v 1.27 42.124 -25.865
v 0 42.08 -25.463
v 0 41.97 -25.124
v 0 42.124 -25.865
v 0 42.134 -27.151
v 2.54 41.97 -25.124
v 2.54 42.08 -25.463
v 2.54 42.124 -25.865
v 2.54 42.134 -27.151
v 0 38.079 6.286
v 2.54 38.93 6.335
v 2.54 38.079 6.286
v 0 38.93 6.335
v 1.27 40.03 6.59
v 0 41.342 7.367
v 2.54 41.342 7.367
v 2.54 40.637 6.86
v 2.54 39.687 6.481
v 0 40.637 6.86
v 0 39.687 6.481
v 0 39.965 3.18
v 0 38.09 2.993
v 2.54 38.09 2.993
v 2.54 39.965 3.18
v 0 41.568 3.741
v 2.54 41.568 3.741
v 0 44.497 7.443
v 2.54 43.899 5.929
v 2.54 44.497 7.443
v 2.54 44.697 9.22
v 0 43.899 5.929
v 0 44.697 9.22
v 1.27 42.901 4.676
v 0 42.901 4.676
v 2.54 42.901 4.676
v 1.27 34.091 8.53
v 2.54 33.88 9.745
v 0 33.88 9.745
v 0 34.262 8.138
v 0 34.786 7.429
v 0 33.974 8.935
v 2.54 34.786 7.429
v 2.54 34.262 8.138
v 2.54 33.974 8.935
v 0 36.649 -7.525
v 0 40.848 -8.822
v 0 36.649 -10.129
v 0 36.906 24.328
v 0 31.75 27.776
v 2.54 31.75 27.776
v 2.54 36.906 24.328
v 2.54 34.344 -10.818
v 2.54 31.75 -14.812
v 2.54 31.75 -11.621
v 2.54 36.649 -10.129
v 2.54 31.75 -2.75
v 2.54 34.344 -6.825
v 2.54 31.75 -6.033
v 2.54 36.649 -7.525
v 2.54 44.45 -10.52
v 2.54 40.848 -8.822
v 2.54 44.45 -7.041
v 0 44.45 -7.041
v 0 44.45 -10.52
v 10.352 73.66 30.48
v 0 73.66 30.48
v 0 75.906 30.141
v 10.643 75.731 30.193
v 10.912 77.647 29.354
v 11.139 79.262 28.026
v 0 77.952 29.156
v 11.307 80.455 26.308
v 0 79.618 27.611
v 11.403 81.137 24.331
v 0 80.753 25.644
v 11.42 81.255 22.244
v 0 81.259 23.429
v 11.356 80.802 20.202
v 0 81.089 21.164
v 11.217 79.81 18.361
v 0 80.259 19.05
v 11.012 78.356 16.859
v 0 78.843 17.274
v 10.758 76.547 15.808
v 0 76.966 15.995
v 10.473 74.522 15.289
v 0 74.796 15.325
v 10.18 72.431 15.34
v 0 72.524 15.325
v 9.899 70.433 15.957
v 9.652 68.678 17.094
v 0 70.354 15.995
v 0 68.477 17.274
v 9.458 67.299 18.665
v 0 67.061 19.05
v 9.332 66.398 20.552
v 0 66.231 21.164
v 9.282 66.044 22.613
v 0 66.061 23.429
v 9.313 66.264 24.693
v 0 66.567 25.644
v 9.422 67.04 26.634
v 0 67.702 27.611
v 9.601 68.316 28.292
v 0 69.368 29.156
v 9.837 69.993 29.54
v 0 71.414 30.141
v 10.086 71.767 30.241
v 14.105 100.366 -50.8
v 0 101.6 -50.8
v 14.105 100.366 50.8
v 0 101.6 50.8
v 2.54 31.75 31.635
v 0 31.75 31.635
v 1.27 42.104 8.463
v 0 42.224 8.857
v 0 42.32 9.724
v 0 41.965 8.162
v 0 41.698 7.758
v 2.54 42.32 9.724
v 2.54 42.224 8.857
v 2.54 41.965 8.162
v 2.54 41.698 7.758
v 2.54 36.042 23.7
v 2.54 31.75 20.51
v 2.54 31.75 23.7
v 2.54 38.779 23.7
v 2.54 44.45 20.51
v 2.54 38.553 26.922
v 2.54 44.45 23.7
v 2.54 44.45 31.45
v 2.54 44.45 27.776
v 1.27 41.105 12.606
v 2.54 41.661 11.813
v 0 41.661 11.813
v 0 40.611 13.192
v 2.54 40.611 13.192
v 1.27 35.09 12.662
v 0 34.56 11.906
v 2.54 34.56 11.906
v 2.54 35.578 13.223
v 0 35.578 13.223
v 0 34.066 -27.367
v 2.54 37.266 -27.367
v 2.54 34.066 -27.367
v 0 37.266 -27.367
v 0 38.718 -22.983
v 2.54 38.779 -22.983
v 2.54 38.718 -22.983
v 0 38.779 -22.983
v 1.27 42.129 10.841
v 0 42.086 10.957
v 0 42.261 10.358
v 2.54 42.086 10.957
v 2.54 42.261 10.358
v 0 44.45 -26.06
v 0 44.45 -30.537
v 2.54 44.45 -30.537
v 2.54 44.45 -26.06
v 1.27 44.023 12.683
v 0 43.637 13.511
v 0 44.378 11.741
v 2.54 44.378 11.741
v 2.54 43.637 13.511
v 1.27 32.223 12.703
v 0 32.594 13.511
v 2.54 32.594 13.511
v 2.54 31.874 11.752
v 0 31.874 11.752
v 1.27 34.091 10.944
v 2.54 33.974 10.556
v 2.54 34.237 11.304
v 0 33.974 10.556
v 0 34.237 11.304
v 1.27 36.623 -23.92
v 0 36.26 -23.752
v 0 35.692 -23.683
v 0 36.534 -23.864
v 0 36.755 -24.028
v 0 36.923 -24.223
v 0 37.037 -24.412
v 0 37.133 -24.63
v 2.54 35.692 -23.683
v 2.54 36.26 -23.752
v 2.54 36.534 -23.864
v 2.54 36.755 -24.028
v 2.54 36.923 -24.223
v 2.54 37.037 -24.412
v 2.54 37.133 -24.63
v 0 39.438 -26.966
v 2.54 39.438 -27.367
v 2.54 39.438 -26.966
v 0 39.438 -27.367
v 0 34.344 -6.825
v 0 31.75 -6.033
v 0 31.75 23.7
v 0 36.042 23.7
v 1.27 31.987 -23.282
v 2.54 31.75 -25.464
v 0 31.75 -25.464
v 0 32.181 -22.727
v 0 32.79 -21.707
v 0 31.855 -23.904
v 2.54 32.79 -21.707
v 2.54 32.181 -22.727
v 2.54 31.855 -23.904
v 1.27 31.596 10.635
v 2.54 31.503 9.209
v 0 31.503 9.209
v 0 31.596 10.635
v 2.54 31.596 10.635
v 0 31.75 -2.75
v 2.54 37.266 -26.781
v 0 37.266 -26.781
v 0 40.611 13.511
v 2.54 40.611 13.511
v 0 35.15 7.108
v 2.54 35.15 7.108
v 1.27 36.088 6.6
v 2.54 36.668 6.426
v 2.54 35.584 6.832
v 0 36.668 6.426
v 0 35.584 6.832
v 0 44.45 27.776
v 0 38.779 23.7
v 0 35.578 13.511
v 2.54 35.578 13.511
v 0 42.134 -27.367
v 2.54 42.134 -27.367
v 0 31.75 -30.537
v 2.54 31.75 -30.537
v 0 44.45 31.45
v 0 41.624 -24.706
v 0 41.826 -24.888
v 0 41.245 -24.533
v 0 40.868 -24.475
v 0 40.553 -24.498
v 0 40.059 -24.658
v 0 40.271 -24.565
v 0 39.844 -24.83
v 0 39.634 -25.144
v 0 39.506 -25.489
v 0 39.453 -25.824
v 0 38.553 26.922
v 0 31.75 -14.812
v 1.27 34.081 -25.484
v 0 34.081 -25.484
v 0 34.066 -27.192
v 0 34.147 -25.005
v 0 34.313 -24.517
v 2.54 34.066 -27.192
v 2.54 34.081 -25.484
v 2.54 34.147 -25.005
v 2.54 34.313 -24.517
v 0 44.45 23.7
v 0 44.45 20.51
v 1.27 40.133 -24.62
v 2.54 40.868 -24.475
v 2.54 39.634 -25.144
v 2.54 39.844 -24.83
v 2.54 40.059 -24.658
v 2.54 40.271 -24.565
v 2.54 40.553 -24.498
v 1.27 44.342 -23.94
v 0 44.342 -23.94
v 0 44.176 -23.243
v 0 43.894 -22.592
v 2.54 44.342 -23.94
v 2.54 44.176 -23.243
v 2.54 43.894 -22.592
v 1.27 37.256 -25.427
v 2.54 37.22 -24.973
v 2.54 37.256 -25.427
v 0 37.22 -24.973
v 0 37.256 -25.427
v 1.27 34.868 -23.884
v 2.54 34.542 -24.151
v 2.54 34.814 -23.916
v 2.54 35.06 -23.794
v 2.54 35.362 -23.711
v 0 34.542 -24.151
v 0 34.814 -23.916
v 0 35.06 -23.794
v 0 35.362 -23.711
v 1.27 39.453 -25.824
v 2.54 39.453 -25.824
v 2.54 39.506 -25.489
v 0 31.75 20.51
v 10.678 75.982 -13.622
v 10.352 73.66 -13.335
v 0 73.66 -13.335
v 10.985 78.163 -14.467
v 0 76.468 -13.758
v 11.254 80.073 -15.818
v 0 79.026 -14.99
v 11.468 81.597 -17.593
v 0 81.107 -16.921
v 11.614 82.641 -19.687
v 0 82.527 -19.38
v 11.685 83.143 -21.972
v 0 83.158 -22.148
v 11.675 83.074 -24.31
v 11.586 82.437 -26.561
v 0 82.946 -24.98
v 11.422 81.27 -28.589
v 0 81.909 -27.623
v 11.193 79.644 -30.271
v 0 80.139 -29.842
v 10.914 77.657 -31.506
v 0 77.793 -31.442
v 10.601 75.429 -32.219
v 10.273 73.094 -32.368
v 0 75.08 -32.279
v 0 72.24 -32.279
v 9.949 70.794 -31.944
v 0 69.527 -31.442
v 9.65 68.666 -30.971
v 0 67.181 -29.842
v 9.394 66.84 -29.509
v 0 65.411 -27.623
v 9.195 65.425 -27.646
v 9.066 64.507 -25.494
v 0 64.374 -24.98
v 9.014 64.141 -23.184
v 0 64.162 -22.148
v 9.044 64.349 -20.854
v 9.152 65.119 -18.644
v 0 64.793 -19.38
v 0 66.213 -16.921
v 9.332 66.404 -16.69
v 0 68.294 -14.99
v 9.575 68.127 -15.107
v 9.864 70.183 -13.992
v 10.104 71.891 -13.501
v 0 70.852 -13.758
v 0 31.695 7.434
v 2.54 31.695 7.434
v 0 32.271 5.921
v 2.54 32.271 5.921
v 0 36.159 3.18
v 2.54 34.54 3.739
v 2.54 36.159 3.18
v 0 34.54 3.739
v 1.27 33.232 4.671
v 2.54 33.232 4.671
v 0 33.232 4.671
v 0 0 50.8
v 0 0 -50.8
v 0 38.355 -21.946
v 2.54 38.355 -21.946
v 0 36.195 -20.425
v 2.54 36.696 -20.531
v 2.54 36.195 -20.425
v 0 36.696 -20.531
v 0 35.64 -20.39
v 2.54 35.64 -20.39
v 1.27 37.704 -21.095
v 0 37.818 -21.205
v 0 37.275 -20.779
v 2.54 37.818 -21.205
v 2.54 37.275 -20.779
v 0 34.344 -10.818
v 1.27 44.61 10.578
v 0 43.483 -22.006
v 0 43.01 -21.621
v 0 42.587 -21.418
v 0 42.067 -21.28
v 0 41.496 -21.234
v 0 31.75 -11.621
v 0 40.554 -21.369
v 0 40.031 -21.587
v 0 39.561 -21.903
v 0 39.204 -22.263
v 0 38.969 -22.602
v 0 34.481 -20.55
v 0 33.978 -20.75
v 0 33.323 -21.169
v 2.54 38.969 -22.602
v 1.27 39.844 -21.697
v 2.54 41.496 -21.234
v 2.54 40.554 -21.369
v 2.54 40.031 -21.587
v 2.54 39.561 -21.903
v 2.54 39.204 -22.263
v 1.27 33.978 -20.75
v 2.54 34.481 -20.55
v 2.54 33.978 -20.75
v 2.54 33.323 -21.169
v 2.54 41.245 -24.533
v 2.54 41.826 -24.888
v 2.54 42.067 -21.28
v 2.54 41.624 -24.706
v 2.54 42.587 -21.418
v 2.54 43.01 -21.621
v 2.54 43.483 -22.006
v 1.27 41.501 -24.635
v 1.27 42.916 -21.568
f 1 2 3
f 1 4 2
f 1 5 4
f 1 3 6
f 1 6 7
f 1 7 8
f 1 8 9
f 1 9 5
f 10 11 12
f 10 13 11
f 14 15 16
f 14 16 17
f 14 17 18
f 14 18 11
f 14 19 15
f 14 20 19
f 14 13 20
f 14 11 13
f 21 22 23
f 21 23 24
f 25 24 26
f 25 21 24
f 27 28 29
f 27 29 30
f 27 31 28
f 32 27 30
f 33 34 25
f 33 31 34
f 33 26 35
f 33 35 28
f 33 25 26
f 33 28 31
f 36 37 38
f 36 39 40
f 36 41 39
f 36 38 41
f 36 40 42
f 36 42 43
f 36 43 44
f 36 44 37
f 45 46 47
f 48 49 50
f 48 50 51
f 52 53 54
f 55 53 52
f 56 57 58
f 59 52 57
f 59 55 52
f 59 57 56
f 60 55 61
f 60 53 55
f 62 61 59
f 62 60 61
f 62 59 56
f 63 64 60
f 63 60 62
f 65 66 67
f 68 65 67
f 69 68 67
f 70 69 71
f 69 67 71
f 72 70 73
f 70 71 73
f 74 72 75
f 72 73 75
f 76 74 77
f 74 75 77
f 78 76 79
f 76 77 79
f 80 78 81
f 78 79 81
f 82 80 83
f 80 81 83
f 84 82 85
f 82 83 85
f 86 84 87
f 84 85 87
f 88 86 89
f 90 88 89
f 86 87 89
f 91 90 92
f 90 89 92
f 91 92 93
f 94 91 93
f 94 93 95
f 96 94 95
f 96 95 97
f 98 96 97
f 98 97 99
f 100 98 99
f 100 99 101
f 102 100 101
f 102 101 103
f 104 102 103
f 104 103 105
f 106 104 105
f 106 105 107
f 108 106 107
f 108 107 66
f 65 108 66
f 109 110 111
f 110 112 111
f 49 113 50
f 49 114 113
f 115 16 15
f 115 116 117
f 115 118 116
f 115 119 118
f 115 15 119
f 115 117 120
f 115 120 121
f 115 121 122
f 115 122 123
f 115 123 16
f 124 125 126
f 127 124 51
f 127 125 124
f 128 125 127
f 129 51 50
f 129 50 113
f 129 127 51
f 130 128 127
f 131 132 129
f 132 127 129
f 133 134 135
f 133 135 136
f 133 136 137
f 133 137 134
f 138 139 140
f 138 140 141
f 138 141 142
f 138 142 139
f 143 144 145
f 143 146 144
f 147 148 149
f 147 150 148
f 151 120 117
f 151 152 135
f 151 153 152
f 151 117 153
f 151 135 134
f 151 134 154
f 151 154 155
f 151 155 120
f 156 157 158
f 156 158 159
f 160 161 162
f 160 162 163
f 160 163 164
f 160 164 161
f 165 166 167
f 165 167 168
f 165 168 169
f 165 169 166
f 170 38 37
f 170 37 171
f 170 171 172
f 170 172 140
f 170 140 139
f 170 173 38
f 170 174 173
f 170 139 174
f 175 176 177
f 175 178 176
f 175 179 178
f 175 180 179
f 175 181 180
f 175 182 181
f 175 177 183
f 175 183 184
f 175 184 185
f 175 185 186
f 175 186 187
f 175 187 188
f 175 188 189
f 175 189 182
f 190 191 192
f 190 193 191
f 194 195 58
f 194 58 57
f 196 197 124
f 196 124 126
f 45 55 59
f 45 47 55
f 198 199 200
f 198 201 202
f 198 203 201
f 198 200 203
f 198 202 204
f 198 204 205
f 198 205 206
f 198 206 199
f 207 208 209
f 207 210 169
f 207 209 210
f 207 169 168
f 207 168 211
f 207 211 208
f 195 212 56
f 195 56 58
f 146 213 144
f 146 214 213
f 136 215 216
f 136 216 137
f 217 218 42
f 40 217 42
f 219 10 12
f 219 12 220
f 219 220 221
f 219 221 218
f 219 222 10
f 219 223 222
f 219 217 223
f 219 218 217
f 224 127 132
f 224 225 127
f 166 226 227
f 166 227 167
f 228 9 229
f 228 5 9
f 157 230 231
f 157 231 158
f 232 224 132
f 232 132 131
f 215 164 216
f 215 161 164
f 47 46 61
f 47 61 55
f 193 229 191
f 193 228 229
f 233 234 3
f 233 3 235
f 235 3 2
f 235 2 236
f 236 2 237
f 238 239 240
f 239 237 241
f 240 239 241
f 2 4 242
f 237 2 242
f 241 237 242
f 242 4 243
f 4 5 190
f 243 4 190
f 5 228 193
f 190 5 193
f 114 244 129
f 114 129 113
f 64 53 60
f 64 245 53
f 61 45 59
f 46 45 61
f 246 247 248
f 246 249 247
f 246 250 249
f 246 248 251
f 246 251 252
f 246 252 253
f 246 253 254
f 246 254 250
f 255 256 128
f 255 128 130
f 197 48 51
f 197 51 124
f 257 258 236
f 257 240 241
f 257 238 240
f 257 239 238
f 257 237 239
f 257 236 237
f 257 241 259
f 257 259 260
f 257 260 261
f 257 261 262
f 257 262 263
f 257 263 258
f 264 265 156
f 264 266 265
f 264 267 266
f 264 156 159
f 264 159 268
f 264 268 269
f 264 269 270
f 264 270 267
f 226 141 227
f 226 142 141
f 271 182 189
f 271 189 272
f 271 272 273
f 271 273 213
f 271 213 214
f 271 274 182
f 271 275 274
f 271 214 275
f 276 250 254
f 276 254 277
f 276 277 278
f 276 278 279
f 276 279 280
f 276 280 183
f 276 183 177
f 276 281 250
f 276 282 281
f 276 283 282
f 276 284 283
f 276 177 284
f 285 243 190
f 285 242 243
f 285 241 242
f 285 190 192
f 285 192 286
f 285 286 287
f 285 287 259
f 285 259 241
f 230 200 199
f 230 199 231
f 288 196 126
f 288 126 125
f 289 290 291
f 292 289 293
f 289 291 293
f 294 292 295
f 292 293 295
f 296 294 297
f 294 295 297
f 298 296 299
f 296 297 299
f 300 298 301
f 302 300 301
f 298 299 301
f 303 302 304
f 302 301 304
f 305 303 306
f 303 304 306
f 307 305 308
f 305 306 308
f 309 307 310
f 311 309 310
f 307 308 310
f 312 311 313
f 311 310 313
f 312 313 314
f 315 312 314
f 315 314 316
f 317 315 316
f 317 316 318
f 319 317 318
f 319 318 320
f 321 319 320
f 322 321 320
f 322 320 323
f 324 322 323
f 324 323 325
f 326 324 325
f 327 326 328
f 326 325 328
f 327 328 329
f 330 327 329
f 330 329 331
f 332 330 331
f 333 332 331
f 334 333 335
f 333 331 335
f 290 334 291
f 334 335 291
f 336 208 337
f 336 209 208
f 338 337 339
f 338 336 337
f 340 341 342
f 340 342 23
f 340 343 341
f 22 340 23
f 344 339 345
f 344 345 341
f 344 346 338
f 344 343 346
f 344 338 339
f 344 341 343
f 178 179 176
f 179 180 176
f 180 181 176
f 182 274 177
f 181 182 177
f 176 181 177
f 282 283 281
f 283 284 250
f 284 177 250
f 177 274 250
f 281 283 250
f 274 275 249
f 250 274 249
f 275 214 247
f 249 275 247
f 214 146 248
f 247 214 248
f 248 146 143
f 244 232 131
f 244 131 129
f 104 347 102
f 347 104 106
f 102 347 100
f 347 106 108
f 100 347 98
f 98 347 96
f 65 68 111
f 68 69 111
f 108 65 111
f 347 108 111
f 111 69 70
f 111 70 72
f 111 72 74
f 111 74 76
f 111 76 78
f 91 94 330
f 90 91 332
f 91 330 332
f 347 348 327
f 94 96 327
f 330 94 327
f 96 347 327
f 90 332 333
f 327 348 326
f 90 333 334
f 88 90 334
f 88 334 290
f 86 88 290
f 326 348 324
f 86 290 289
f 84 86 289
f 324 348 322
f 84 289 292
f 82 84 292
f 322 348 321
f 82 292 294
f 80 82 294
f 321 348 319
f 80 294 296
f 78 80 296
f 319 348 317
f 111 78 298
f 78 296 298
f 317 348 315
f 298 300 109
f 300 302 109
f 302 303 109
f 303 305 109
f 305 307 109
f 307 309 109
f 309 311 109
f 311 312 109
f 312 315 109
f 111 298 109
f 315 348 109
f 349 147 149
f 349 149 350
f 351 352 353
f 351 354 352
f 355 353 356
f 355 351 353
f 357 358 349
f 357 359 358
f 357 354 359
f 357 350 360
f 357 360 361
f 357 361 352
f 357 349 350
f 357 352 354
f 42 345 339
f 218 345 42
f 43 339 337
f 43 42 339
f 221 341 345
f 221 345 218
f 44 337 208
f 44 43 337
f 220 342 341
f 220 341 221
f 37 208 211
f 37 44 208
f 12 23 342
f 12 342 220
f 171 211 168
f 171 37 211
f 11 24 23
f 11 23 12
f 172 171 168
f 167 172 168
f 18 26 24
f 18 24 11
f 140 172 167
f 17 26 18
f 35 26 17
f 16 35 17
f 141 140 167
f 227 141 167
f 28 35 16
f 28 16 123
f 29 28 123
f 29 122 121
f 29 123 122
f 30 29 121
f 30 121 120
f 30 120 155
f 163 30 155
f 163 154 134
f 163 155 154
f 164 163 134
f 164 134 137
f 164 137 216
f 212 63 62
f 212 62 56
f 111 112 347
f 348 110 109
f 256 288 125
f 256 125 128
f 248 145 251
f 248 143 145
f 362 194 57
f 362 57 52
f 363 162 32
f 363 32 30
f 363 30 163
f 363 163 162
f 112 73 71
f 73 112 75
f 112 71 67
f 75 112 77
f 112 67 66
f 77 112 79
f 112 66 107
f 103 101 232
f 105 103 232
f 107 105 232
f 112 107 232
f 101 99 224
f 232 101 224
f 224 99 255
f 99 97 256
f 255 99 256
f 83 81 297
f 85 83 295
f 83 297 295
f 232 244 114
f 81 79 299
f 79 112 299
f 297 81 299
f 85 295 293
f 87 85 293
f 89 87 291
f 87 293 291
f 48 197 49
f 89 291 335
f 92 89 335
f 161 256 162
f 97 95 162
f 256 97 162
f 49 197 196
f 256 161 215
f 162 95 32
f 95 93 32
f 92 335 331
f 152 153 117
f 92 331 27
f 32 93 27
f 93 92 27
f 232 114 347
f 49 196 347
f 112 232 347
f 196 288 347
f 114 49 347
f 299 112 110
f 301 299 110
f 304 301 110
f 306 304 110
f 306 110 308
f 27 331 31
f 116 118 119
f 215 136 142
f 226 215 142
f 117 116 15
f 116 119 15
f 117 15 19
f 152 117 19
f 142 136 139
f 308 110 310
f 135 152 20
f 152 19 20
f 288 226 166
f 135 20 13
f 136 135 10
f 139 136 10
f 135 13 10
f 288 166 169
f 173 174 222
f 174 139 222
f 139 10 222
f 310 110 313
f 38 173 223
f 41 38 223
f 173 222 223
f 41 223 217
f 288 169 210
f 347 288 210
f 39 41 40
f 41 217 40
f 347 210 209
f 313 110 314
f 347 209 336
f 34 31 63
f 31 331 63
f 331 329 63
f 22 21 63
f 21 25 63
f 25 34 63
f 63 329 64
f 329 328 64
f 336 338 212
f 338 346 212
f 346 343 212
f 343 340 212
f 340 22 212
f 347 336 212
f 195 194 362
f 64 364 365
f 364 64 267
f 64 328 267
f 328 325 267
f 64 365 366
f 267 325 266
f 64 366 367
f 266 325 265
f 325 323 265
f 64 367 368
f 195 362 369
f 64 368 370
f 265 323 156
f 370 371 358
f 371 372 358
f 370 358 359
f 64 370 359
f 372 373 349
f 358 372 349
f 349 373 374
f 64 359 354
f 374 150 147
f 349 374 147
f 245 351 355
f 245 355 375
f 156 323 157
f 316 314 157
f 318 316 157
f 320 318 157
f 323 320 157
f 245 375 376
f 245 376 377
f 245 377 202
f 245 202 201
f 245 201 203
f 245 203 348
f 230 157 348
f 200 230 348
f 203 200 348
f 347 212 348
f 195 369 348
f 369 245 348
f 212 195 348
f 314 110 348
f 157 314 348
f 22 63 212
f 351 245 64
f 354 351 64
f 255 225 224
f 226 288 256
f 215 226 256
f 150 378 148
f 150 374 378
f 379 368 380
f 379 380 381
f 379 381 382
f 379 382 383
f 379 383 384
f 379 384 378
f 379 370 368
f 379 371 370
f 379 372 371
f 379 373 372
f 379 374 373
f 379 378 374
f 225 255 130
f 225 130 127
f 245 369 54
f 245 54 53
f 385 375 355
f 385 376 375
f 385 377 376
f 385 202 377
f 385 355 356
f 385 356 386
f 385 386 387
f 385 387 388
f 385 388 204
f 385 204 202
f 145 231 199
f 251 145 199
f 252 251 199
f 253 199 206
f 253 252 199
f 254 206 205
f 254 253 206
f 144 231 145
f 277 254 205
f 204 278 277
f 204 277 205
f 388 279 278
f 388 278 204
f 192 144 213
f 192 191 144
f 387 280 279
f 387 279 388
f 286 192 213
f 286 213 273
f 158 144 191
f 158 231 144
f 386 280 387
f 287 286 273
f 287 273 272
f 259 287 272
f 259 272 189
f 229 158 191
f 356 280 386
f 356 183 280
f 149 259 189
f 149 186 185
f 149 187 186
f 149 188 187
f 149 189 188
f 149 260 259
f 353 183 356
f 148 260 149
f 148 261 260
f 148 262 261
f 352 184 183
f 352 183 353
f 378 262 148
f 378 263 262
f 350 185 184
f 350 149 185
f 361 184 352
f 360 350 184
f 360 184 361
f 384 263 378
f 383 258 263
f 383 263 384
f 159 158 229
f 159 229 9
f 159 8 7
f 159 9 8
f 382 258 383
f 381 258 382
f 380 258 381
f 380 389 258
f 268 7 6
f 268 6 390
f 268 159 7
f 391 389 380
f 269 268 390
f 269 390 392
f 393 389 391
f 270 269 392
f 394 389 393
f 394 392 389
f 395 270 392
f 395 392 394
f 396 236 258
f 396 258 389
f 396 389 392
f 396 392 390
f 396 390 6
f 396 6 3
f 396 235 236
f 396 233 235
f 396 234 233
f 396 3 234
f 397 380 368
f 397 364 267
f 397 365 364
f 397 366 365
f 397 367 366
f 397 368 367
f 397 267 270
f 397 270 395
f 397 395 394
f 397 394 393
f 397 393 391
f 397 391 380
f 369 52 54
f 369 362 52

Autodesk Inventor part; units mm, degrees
ref_plane "YZ Plane" through (0, 0, 0) normal (1, 0, 0) x (0, 1, 0)
ref_plane "XZ Plane" through (0, 0, 0) normal (0, 1, 0) x (-1, 0, 0)
sketch "Sketch1" plane through (0, 0, 0) normal (0, 0, 1) x (1, 0, 0)
  line L0 (0, 0) -> (14.2789, 101.6)
  line L1 (14.2789, 101.6) -> (0, 101.6)
  line L2 (0, 101.6) -> (0, 0)
  dimension "d0" = 101.6
  dimension "d1" = 8
  dimension "d2" = 14.279
extrude "Extrusion1" add sketch "Sketch1" along normal mid plane 101.6
ref_plane "Work Plane2" through (0, 0, 42.3872) normal (-1, 0, 0) x (0, 0, 1)
sketch "Sketch6" plane through (0, 0, 42.3872) normal (-1, 0, 0) x (0, 0, 1)
  line L0 (-84.1061, 73.66) -> (0, 73.66) construction
  line L1 (0, 101.6) -> (0, 0) construction
  line L2 (-84.7743, 101.6) -> (0, 101.6) construction
  circle A0 centre (-65.2472, 73.66) radius 9.525
  circle A1 centre (-19.5272, 73.66) radius 7.62
  line L3 (-42.3872, 121.92) -> (-42.3872, -20.32) projected
  point P0 (-42.3872, 0)
  dimension "d18" = 27.94
  dimension "d19" = 19.05
  dimension "d20" = 15.24
  dimension "d21" = 22.86
  dimension "d22" = 22.86
  dimension "d23" = 45.72
extrude "Extrusion5" cut sketch "Sketch6" against normal through all
ref_plane "Work Plane3" through (0, 0, 22.86) normal (0, 0, 1) x (1, 0, 0)
ref_plane "Work Plane4" through (0, 0, -22.86) normal (0, 0, 1) x (1, 0, 0)
sketch "Sketch9" plane through (0, 0, -50.8) normal (-1, 0, 0) x (0, 0, 1)
  line L0 (0, 101.6) -> (0, 0) construction
  line L1 (0, 38.1) -> (100.9997, 38.1) construction
  line L2 (0, 0) -> (101.6, 0) construction
  spline S0 degree 2 poles (30.4104, 35.6403) (30.4104, 34.6934) (29.6899, 33.2629) (29.093, 32.7895) knots 0 0 0 1 2 2 2
  spline S1 degree 2 poles (29.093, 32.7895) (28.3726, 32.2234) (26.6642, 31.75) (25.3365, 31.75) knots 0 0 0 1 2 2 2
  line L3 (25.3365, 31.75) -> (20.2627, 31.75)
  line L4 (20.2627, 31.75) -> (20.2627, 44.45)
  line L5 (20.2627, 44.45) -> (24.7396, 44.45)
  spline S2 degree 2 poles (24.7396, 44.45) (26.1393, 44.45) (27.5801, 44.2339) (28.2079, 43.8942) knots 0 0 0 1 2 2 2
  spline S3 degree 2 poles (28.2079, 43.8942) (28.8975, 43.534) (29.5664, 42.299) (29.5664, 41.4963) knots 0 0 0 1 2 2 2
  spline S4 degree 2 poles (29.5664, 41.4963) (29.5664, 40.57) (28.6402, 39.1189) (27.8169, 38.7793) knots 0 0 0 1 2 2 2
  line L6 (27.8169, 38.7793) -> (27.8169, 38.7175)
  spline S5 degree 2 poles (27.8169, 38.7175) (29.0004, 38.4705) (30.4104, 36.937) (30.4104, 35.6403) knots 0 0 0 1 2 2 2
  spline S6 degree 2 poles (27.117, 35.6917) (27.117, 36.2887) (26.6436, 36.9576) (26.1702, 37.1326) knots 0 0 0 1 2 2 2
  spline S7 degree 2 poles (26.1702, 37.1326) (25.882, 37.2458) (24.8631, 37.2664) (24.0192, 37.2664) knots 0 0 0 1 2 2 2
  line L7 (24.0192, 37.2664) -> (23.4326, 37.2664)
  line L8 (23.4326, 37.2664) -> (23.4326, 34.0656)
  line L9 (23.4326, 34.0656) -> (23.6075, 34.0656)
  spline S8 degree 2 poles (23.6075, 34.0656) (24.8425, 34.0656) (25.7894, 34.0965) (26.2834, 34.3126) knots 0 0 0 1 2 2 2
  spline S9 degree 2 poles (26.2834, 34.3126) (26.7156, 34.5082) (27.117, 35.2286) (27.117, 35.6917) knots 0 0 0 1 2 2 2
  spline S10 degree 2 poles (26.3246, 40.8685) (26.3246, 41.1772) (26.0055, 41.8256) (25.6762, 41.9697) knots 0 0 0 1 2 2 2
  spline S11 degree 2 poles (25.6762, 41.9697) (25.3674, 42.1138) (24.5029, 42.1344) (23.6487, 42.1344) knots 0 0 0 1 2 2 2
  line L10 (23.6487, 42.1344) -> (23.4326, 42.1344)
  line L11 (23.4326, 42.1344) -> (23.4326, 39.4379)
  line L12 (23.4326, 39.4379) -> (23.834, 39.4379)
  spline S12 degree 2 poles (23.834, 39.4379) (24.647, 39.4379) (25.3057, 39.4688) (25.6556, 39.6335) knots 0 0 0 1 2 2 2
  spline S13 degree 2 poles (25.6556, 39.6335) (26.0364, 39.8187) (26.3246, 40.4465) (26.3246, 40.8685) knots 0 0 0 1 2 2 2
  line L13 (35.9885, 31.75) -> (40.2801, 44.45)
  line L14 (40.2801, 44.45) -> (43.7587, 44.45)
  line L15 (43.7587, 44.45) -> (48.0504, 31.75)
  line L16 (48.0504, 31.75) -> (44.7673, 31.75)
  line L17 (44.7673, 31.75) -> (43.9749, 34.3435)
  line L18 (43.9749, 34.3435) -> (39.9817, 34.3435)
  line L19 (39.9817, 34.3435) -> (39.1789, 31.75)
  line L20 (39.1789, 31.75) -> (35.9885, 31.75)
  line L21 (43.275, 36.6489) -> (41.9783, 40.8479)
  line L22 (41.9783, 40.8479) -> (40.6712, 36.6489)
  line L23 (40.6712, 36.6489) -> (43.275, 36.6489)
  spline S14 degree 2 poles (60.0094, 31.503) (57.1483, 31.503) (53.7932, 34.961) (53.7932, 38.0897) knots 0 0 0 1 2 2 2
  spline S15 degree 2 poles (53.7932, 38.0897) (53.7932, 41.1052) (57.1586, 44.697) (60.0197, 44.697) knots 0 0 0 1 2 2 2
  spline S16 degree 2 poles (60.0197, 44.697) (60.771, 44.697) (61.9854, 44.522) (62.5412, 44.378) knots 0 0 0 1 2 2 2
  spline S17 degree 2 poles (62.5412, 44.378) (62.9734, 44.2442) (63.9923, 43.8016) (64.3113, 43.637) knots 0 0 0 1 2 2 2
  line L24 (64.3113, 43.637) -> (64.3113, 40.6112)
  line L25 (64.3113, 40.6112) -> (63.9923, 40.6112)
  spline S18 degree 2 poles (63.9923, 40.6112) (63.7556, 40.817) (63.0557, 41.3934) (62.6132, 41.6609) knots 0 0 0 1 2 2 2
  spline S19 degree 2 poles (62.6132, 41.6609) (62.1707, 41.9388) (61.1106, 42.3196) (60.524, 42.3196) knots 0 0 0 1 2 2 2
  spline S20 degree 2 poles (60.524, 42.3196) (59.8344, 42.3196) (58.6921, 41.8874) (58.1672, 41.3419) knots 0 0 0 1 2 2 2
  spline S21 degree 2 poles (58.1672, 41.3419) (57.6938, 40.8582) (57.0865, 39.2012) (57.0865, 38.0794) knots 0 0 0 1 2 2 2
  spline S22 degree 2 poles (57.0865, 38.0794) (57.0865, 36.8959) (57.7143, 35.2801) (58.2289, 34.7861) knots 0 0 0 1 2 2 2
  spline S23 degree 2 poles (58.2289, 34.7861) (58.7229, 34.3024) (59.9374, 33.8804) (60.5446, 33.8804) knots 0 0 0 1 2 2 2
  spline S24 degree 2 poles (60.5446, 33.8804) (61.1724, 33.8804) (62.3147, 34.3024) (62.7058, 34.5596) knots 0 0 0 1 2 2 2
  spline S25 degree 2 poles (62.7058, 34.5596) (63.1381, 34.8169) (63.7865, 35.3624) (64.0232, 35.5785) knots 0 0 0 1 2 2 2
  line L26 (64.0232, 35.5785) -> (64.3113, 35.5785)
  line L27 (64.3113, 35.5785) -> (64.3113, 32.5939)
  spline S26 degree 2 poles (64.3113, 32.5939) (63.9614, 32.4293) (63.0455, 32.0176) (62.5515, 31.8735) knots 0 0 0 1 2 2 2
  spline S27 degree 2 poles (62.5515, 31.8735) (61.9545, 31.6882) (60.9151, 31.503) (60.0094, 31.503) knots 0 0 0 1 2 2 2
  line L28 (82.4351, 31.75) -> (78.5757, 31.75)
  line L29 (78.5757, 31.75) -> (75.128, 36.9062)
  line L30 (75.128, 36.9062) -> (74.5002, 36.0417)
  line L31 (74.5002, 36.0417) -> (74.5002, 31.75)
  line L32 (74.5002, 31.75) -> (71.3097, 31.75)
  line L33 (71.3097, 31.75) -> (71.3097, 44.45)
  line L34 (71.3097, 44.45) -> (74.5002, 44.45)
  line L35 (74.5002, 44.45) -> (74.5002, 38.7793)
  line L36 (74.5002, 38.7793) -> (78.5757, 44.45)
  line L37 (78.5757, 44.45) -> (82.2498, 44.45)
  line L38 (82.2498, 44.45) -> (77.7215, 38.5528)
  line L39 (77.7215, 38.5528) -> (82.4351, 31.75)
  point P0 (50.8, 0)
  dimension "d35" = 38.1
extrude "TextforBack" cut sketch "Sketch9" against normal blind 2.54
sketch "Sketch10" plane through (0, 0, 0) normal (0, 0, 1) x (1, 0, 0)
  line L0 (14.2789, 101.6) -> (0, 0) projected
  line L1 (0, 101.6) -> (14.2789, 101.6) projected
  line L2 (0, 0) -> (0, 101.6) projected
  line L3 (0, 101.6) -> (14.1055, 100.3659)
  line L4 (0, 101.6) -> (14.1594, 101.6) construction
  line L5 (14.1055, 100.3659) -> (14.2789, 101.6)
  line L6 (14.2789, 101.6) -> (0, 101.6)
  dimension "d38" = 5
extrude "Extrusion8" cut sketch "Sketch10" against normal through all both and the other way through all contours L0 L3 L1
properties part number "twoPipeCover"
